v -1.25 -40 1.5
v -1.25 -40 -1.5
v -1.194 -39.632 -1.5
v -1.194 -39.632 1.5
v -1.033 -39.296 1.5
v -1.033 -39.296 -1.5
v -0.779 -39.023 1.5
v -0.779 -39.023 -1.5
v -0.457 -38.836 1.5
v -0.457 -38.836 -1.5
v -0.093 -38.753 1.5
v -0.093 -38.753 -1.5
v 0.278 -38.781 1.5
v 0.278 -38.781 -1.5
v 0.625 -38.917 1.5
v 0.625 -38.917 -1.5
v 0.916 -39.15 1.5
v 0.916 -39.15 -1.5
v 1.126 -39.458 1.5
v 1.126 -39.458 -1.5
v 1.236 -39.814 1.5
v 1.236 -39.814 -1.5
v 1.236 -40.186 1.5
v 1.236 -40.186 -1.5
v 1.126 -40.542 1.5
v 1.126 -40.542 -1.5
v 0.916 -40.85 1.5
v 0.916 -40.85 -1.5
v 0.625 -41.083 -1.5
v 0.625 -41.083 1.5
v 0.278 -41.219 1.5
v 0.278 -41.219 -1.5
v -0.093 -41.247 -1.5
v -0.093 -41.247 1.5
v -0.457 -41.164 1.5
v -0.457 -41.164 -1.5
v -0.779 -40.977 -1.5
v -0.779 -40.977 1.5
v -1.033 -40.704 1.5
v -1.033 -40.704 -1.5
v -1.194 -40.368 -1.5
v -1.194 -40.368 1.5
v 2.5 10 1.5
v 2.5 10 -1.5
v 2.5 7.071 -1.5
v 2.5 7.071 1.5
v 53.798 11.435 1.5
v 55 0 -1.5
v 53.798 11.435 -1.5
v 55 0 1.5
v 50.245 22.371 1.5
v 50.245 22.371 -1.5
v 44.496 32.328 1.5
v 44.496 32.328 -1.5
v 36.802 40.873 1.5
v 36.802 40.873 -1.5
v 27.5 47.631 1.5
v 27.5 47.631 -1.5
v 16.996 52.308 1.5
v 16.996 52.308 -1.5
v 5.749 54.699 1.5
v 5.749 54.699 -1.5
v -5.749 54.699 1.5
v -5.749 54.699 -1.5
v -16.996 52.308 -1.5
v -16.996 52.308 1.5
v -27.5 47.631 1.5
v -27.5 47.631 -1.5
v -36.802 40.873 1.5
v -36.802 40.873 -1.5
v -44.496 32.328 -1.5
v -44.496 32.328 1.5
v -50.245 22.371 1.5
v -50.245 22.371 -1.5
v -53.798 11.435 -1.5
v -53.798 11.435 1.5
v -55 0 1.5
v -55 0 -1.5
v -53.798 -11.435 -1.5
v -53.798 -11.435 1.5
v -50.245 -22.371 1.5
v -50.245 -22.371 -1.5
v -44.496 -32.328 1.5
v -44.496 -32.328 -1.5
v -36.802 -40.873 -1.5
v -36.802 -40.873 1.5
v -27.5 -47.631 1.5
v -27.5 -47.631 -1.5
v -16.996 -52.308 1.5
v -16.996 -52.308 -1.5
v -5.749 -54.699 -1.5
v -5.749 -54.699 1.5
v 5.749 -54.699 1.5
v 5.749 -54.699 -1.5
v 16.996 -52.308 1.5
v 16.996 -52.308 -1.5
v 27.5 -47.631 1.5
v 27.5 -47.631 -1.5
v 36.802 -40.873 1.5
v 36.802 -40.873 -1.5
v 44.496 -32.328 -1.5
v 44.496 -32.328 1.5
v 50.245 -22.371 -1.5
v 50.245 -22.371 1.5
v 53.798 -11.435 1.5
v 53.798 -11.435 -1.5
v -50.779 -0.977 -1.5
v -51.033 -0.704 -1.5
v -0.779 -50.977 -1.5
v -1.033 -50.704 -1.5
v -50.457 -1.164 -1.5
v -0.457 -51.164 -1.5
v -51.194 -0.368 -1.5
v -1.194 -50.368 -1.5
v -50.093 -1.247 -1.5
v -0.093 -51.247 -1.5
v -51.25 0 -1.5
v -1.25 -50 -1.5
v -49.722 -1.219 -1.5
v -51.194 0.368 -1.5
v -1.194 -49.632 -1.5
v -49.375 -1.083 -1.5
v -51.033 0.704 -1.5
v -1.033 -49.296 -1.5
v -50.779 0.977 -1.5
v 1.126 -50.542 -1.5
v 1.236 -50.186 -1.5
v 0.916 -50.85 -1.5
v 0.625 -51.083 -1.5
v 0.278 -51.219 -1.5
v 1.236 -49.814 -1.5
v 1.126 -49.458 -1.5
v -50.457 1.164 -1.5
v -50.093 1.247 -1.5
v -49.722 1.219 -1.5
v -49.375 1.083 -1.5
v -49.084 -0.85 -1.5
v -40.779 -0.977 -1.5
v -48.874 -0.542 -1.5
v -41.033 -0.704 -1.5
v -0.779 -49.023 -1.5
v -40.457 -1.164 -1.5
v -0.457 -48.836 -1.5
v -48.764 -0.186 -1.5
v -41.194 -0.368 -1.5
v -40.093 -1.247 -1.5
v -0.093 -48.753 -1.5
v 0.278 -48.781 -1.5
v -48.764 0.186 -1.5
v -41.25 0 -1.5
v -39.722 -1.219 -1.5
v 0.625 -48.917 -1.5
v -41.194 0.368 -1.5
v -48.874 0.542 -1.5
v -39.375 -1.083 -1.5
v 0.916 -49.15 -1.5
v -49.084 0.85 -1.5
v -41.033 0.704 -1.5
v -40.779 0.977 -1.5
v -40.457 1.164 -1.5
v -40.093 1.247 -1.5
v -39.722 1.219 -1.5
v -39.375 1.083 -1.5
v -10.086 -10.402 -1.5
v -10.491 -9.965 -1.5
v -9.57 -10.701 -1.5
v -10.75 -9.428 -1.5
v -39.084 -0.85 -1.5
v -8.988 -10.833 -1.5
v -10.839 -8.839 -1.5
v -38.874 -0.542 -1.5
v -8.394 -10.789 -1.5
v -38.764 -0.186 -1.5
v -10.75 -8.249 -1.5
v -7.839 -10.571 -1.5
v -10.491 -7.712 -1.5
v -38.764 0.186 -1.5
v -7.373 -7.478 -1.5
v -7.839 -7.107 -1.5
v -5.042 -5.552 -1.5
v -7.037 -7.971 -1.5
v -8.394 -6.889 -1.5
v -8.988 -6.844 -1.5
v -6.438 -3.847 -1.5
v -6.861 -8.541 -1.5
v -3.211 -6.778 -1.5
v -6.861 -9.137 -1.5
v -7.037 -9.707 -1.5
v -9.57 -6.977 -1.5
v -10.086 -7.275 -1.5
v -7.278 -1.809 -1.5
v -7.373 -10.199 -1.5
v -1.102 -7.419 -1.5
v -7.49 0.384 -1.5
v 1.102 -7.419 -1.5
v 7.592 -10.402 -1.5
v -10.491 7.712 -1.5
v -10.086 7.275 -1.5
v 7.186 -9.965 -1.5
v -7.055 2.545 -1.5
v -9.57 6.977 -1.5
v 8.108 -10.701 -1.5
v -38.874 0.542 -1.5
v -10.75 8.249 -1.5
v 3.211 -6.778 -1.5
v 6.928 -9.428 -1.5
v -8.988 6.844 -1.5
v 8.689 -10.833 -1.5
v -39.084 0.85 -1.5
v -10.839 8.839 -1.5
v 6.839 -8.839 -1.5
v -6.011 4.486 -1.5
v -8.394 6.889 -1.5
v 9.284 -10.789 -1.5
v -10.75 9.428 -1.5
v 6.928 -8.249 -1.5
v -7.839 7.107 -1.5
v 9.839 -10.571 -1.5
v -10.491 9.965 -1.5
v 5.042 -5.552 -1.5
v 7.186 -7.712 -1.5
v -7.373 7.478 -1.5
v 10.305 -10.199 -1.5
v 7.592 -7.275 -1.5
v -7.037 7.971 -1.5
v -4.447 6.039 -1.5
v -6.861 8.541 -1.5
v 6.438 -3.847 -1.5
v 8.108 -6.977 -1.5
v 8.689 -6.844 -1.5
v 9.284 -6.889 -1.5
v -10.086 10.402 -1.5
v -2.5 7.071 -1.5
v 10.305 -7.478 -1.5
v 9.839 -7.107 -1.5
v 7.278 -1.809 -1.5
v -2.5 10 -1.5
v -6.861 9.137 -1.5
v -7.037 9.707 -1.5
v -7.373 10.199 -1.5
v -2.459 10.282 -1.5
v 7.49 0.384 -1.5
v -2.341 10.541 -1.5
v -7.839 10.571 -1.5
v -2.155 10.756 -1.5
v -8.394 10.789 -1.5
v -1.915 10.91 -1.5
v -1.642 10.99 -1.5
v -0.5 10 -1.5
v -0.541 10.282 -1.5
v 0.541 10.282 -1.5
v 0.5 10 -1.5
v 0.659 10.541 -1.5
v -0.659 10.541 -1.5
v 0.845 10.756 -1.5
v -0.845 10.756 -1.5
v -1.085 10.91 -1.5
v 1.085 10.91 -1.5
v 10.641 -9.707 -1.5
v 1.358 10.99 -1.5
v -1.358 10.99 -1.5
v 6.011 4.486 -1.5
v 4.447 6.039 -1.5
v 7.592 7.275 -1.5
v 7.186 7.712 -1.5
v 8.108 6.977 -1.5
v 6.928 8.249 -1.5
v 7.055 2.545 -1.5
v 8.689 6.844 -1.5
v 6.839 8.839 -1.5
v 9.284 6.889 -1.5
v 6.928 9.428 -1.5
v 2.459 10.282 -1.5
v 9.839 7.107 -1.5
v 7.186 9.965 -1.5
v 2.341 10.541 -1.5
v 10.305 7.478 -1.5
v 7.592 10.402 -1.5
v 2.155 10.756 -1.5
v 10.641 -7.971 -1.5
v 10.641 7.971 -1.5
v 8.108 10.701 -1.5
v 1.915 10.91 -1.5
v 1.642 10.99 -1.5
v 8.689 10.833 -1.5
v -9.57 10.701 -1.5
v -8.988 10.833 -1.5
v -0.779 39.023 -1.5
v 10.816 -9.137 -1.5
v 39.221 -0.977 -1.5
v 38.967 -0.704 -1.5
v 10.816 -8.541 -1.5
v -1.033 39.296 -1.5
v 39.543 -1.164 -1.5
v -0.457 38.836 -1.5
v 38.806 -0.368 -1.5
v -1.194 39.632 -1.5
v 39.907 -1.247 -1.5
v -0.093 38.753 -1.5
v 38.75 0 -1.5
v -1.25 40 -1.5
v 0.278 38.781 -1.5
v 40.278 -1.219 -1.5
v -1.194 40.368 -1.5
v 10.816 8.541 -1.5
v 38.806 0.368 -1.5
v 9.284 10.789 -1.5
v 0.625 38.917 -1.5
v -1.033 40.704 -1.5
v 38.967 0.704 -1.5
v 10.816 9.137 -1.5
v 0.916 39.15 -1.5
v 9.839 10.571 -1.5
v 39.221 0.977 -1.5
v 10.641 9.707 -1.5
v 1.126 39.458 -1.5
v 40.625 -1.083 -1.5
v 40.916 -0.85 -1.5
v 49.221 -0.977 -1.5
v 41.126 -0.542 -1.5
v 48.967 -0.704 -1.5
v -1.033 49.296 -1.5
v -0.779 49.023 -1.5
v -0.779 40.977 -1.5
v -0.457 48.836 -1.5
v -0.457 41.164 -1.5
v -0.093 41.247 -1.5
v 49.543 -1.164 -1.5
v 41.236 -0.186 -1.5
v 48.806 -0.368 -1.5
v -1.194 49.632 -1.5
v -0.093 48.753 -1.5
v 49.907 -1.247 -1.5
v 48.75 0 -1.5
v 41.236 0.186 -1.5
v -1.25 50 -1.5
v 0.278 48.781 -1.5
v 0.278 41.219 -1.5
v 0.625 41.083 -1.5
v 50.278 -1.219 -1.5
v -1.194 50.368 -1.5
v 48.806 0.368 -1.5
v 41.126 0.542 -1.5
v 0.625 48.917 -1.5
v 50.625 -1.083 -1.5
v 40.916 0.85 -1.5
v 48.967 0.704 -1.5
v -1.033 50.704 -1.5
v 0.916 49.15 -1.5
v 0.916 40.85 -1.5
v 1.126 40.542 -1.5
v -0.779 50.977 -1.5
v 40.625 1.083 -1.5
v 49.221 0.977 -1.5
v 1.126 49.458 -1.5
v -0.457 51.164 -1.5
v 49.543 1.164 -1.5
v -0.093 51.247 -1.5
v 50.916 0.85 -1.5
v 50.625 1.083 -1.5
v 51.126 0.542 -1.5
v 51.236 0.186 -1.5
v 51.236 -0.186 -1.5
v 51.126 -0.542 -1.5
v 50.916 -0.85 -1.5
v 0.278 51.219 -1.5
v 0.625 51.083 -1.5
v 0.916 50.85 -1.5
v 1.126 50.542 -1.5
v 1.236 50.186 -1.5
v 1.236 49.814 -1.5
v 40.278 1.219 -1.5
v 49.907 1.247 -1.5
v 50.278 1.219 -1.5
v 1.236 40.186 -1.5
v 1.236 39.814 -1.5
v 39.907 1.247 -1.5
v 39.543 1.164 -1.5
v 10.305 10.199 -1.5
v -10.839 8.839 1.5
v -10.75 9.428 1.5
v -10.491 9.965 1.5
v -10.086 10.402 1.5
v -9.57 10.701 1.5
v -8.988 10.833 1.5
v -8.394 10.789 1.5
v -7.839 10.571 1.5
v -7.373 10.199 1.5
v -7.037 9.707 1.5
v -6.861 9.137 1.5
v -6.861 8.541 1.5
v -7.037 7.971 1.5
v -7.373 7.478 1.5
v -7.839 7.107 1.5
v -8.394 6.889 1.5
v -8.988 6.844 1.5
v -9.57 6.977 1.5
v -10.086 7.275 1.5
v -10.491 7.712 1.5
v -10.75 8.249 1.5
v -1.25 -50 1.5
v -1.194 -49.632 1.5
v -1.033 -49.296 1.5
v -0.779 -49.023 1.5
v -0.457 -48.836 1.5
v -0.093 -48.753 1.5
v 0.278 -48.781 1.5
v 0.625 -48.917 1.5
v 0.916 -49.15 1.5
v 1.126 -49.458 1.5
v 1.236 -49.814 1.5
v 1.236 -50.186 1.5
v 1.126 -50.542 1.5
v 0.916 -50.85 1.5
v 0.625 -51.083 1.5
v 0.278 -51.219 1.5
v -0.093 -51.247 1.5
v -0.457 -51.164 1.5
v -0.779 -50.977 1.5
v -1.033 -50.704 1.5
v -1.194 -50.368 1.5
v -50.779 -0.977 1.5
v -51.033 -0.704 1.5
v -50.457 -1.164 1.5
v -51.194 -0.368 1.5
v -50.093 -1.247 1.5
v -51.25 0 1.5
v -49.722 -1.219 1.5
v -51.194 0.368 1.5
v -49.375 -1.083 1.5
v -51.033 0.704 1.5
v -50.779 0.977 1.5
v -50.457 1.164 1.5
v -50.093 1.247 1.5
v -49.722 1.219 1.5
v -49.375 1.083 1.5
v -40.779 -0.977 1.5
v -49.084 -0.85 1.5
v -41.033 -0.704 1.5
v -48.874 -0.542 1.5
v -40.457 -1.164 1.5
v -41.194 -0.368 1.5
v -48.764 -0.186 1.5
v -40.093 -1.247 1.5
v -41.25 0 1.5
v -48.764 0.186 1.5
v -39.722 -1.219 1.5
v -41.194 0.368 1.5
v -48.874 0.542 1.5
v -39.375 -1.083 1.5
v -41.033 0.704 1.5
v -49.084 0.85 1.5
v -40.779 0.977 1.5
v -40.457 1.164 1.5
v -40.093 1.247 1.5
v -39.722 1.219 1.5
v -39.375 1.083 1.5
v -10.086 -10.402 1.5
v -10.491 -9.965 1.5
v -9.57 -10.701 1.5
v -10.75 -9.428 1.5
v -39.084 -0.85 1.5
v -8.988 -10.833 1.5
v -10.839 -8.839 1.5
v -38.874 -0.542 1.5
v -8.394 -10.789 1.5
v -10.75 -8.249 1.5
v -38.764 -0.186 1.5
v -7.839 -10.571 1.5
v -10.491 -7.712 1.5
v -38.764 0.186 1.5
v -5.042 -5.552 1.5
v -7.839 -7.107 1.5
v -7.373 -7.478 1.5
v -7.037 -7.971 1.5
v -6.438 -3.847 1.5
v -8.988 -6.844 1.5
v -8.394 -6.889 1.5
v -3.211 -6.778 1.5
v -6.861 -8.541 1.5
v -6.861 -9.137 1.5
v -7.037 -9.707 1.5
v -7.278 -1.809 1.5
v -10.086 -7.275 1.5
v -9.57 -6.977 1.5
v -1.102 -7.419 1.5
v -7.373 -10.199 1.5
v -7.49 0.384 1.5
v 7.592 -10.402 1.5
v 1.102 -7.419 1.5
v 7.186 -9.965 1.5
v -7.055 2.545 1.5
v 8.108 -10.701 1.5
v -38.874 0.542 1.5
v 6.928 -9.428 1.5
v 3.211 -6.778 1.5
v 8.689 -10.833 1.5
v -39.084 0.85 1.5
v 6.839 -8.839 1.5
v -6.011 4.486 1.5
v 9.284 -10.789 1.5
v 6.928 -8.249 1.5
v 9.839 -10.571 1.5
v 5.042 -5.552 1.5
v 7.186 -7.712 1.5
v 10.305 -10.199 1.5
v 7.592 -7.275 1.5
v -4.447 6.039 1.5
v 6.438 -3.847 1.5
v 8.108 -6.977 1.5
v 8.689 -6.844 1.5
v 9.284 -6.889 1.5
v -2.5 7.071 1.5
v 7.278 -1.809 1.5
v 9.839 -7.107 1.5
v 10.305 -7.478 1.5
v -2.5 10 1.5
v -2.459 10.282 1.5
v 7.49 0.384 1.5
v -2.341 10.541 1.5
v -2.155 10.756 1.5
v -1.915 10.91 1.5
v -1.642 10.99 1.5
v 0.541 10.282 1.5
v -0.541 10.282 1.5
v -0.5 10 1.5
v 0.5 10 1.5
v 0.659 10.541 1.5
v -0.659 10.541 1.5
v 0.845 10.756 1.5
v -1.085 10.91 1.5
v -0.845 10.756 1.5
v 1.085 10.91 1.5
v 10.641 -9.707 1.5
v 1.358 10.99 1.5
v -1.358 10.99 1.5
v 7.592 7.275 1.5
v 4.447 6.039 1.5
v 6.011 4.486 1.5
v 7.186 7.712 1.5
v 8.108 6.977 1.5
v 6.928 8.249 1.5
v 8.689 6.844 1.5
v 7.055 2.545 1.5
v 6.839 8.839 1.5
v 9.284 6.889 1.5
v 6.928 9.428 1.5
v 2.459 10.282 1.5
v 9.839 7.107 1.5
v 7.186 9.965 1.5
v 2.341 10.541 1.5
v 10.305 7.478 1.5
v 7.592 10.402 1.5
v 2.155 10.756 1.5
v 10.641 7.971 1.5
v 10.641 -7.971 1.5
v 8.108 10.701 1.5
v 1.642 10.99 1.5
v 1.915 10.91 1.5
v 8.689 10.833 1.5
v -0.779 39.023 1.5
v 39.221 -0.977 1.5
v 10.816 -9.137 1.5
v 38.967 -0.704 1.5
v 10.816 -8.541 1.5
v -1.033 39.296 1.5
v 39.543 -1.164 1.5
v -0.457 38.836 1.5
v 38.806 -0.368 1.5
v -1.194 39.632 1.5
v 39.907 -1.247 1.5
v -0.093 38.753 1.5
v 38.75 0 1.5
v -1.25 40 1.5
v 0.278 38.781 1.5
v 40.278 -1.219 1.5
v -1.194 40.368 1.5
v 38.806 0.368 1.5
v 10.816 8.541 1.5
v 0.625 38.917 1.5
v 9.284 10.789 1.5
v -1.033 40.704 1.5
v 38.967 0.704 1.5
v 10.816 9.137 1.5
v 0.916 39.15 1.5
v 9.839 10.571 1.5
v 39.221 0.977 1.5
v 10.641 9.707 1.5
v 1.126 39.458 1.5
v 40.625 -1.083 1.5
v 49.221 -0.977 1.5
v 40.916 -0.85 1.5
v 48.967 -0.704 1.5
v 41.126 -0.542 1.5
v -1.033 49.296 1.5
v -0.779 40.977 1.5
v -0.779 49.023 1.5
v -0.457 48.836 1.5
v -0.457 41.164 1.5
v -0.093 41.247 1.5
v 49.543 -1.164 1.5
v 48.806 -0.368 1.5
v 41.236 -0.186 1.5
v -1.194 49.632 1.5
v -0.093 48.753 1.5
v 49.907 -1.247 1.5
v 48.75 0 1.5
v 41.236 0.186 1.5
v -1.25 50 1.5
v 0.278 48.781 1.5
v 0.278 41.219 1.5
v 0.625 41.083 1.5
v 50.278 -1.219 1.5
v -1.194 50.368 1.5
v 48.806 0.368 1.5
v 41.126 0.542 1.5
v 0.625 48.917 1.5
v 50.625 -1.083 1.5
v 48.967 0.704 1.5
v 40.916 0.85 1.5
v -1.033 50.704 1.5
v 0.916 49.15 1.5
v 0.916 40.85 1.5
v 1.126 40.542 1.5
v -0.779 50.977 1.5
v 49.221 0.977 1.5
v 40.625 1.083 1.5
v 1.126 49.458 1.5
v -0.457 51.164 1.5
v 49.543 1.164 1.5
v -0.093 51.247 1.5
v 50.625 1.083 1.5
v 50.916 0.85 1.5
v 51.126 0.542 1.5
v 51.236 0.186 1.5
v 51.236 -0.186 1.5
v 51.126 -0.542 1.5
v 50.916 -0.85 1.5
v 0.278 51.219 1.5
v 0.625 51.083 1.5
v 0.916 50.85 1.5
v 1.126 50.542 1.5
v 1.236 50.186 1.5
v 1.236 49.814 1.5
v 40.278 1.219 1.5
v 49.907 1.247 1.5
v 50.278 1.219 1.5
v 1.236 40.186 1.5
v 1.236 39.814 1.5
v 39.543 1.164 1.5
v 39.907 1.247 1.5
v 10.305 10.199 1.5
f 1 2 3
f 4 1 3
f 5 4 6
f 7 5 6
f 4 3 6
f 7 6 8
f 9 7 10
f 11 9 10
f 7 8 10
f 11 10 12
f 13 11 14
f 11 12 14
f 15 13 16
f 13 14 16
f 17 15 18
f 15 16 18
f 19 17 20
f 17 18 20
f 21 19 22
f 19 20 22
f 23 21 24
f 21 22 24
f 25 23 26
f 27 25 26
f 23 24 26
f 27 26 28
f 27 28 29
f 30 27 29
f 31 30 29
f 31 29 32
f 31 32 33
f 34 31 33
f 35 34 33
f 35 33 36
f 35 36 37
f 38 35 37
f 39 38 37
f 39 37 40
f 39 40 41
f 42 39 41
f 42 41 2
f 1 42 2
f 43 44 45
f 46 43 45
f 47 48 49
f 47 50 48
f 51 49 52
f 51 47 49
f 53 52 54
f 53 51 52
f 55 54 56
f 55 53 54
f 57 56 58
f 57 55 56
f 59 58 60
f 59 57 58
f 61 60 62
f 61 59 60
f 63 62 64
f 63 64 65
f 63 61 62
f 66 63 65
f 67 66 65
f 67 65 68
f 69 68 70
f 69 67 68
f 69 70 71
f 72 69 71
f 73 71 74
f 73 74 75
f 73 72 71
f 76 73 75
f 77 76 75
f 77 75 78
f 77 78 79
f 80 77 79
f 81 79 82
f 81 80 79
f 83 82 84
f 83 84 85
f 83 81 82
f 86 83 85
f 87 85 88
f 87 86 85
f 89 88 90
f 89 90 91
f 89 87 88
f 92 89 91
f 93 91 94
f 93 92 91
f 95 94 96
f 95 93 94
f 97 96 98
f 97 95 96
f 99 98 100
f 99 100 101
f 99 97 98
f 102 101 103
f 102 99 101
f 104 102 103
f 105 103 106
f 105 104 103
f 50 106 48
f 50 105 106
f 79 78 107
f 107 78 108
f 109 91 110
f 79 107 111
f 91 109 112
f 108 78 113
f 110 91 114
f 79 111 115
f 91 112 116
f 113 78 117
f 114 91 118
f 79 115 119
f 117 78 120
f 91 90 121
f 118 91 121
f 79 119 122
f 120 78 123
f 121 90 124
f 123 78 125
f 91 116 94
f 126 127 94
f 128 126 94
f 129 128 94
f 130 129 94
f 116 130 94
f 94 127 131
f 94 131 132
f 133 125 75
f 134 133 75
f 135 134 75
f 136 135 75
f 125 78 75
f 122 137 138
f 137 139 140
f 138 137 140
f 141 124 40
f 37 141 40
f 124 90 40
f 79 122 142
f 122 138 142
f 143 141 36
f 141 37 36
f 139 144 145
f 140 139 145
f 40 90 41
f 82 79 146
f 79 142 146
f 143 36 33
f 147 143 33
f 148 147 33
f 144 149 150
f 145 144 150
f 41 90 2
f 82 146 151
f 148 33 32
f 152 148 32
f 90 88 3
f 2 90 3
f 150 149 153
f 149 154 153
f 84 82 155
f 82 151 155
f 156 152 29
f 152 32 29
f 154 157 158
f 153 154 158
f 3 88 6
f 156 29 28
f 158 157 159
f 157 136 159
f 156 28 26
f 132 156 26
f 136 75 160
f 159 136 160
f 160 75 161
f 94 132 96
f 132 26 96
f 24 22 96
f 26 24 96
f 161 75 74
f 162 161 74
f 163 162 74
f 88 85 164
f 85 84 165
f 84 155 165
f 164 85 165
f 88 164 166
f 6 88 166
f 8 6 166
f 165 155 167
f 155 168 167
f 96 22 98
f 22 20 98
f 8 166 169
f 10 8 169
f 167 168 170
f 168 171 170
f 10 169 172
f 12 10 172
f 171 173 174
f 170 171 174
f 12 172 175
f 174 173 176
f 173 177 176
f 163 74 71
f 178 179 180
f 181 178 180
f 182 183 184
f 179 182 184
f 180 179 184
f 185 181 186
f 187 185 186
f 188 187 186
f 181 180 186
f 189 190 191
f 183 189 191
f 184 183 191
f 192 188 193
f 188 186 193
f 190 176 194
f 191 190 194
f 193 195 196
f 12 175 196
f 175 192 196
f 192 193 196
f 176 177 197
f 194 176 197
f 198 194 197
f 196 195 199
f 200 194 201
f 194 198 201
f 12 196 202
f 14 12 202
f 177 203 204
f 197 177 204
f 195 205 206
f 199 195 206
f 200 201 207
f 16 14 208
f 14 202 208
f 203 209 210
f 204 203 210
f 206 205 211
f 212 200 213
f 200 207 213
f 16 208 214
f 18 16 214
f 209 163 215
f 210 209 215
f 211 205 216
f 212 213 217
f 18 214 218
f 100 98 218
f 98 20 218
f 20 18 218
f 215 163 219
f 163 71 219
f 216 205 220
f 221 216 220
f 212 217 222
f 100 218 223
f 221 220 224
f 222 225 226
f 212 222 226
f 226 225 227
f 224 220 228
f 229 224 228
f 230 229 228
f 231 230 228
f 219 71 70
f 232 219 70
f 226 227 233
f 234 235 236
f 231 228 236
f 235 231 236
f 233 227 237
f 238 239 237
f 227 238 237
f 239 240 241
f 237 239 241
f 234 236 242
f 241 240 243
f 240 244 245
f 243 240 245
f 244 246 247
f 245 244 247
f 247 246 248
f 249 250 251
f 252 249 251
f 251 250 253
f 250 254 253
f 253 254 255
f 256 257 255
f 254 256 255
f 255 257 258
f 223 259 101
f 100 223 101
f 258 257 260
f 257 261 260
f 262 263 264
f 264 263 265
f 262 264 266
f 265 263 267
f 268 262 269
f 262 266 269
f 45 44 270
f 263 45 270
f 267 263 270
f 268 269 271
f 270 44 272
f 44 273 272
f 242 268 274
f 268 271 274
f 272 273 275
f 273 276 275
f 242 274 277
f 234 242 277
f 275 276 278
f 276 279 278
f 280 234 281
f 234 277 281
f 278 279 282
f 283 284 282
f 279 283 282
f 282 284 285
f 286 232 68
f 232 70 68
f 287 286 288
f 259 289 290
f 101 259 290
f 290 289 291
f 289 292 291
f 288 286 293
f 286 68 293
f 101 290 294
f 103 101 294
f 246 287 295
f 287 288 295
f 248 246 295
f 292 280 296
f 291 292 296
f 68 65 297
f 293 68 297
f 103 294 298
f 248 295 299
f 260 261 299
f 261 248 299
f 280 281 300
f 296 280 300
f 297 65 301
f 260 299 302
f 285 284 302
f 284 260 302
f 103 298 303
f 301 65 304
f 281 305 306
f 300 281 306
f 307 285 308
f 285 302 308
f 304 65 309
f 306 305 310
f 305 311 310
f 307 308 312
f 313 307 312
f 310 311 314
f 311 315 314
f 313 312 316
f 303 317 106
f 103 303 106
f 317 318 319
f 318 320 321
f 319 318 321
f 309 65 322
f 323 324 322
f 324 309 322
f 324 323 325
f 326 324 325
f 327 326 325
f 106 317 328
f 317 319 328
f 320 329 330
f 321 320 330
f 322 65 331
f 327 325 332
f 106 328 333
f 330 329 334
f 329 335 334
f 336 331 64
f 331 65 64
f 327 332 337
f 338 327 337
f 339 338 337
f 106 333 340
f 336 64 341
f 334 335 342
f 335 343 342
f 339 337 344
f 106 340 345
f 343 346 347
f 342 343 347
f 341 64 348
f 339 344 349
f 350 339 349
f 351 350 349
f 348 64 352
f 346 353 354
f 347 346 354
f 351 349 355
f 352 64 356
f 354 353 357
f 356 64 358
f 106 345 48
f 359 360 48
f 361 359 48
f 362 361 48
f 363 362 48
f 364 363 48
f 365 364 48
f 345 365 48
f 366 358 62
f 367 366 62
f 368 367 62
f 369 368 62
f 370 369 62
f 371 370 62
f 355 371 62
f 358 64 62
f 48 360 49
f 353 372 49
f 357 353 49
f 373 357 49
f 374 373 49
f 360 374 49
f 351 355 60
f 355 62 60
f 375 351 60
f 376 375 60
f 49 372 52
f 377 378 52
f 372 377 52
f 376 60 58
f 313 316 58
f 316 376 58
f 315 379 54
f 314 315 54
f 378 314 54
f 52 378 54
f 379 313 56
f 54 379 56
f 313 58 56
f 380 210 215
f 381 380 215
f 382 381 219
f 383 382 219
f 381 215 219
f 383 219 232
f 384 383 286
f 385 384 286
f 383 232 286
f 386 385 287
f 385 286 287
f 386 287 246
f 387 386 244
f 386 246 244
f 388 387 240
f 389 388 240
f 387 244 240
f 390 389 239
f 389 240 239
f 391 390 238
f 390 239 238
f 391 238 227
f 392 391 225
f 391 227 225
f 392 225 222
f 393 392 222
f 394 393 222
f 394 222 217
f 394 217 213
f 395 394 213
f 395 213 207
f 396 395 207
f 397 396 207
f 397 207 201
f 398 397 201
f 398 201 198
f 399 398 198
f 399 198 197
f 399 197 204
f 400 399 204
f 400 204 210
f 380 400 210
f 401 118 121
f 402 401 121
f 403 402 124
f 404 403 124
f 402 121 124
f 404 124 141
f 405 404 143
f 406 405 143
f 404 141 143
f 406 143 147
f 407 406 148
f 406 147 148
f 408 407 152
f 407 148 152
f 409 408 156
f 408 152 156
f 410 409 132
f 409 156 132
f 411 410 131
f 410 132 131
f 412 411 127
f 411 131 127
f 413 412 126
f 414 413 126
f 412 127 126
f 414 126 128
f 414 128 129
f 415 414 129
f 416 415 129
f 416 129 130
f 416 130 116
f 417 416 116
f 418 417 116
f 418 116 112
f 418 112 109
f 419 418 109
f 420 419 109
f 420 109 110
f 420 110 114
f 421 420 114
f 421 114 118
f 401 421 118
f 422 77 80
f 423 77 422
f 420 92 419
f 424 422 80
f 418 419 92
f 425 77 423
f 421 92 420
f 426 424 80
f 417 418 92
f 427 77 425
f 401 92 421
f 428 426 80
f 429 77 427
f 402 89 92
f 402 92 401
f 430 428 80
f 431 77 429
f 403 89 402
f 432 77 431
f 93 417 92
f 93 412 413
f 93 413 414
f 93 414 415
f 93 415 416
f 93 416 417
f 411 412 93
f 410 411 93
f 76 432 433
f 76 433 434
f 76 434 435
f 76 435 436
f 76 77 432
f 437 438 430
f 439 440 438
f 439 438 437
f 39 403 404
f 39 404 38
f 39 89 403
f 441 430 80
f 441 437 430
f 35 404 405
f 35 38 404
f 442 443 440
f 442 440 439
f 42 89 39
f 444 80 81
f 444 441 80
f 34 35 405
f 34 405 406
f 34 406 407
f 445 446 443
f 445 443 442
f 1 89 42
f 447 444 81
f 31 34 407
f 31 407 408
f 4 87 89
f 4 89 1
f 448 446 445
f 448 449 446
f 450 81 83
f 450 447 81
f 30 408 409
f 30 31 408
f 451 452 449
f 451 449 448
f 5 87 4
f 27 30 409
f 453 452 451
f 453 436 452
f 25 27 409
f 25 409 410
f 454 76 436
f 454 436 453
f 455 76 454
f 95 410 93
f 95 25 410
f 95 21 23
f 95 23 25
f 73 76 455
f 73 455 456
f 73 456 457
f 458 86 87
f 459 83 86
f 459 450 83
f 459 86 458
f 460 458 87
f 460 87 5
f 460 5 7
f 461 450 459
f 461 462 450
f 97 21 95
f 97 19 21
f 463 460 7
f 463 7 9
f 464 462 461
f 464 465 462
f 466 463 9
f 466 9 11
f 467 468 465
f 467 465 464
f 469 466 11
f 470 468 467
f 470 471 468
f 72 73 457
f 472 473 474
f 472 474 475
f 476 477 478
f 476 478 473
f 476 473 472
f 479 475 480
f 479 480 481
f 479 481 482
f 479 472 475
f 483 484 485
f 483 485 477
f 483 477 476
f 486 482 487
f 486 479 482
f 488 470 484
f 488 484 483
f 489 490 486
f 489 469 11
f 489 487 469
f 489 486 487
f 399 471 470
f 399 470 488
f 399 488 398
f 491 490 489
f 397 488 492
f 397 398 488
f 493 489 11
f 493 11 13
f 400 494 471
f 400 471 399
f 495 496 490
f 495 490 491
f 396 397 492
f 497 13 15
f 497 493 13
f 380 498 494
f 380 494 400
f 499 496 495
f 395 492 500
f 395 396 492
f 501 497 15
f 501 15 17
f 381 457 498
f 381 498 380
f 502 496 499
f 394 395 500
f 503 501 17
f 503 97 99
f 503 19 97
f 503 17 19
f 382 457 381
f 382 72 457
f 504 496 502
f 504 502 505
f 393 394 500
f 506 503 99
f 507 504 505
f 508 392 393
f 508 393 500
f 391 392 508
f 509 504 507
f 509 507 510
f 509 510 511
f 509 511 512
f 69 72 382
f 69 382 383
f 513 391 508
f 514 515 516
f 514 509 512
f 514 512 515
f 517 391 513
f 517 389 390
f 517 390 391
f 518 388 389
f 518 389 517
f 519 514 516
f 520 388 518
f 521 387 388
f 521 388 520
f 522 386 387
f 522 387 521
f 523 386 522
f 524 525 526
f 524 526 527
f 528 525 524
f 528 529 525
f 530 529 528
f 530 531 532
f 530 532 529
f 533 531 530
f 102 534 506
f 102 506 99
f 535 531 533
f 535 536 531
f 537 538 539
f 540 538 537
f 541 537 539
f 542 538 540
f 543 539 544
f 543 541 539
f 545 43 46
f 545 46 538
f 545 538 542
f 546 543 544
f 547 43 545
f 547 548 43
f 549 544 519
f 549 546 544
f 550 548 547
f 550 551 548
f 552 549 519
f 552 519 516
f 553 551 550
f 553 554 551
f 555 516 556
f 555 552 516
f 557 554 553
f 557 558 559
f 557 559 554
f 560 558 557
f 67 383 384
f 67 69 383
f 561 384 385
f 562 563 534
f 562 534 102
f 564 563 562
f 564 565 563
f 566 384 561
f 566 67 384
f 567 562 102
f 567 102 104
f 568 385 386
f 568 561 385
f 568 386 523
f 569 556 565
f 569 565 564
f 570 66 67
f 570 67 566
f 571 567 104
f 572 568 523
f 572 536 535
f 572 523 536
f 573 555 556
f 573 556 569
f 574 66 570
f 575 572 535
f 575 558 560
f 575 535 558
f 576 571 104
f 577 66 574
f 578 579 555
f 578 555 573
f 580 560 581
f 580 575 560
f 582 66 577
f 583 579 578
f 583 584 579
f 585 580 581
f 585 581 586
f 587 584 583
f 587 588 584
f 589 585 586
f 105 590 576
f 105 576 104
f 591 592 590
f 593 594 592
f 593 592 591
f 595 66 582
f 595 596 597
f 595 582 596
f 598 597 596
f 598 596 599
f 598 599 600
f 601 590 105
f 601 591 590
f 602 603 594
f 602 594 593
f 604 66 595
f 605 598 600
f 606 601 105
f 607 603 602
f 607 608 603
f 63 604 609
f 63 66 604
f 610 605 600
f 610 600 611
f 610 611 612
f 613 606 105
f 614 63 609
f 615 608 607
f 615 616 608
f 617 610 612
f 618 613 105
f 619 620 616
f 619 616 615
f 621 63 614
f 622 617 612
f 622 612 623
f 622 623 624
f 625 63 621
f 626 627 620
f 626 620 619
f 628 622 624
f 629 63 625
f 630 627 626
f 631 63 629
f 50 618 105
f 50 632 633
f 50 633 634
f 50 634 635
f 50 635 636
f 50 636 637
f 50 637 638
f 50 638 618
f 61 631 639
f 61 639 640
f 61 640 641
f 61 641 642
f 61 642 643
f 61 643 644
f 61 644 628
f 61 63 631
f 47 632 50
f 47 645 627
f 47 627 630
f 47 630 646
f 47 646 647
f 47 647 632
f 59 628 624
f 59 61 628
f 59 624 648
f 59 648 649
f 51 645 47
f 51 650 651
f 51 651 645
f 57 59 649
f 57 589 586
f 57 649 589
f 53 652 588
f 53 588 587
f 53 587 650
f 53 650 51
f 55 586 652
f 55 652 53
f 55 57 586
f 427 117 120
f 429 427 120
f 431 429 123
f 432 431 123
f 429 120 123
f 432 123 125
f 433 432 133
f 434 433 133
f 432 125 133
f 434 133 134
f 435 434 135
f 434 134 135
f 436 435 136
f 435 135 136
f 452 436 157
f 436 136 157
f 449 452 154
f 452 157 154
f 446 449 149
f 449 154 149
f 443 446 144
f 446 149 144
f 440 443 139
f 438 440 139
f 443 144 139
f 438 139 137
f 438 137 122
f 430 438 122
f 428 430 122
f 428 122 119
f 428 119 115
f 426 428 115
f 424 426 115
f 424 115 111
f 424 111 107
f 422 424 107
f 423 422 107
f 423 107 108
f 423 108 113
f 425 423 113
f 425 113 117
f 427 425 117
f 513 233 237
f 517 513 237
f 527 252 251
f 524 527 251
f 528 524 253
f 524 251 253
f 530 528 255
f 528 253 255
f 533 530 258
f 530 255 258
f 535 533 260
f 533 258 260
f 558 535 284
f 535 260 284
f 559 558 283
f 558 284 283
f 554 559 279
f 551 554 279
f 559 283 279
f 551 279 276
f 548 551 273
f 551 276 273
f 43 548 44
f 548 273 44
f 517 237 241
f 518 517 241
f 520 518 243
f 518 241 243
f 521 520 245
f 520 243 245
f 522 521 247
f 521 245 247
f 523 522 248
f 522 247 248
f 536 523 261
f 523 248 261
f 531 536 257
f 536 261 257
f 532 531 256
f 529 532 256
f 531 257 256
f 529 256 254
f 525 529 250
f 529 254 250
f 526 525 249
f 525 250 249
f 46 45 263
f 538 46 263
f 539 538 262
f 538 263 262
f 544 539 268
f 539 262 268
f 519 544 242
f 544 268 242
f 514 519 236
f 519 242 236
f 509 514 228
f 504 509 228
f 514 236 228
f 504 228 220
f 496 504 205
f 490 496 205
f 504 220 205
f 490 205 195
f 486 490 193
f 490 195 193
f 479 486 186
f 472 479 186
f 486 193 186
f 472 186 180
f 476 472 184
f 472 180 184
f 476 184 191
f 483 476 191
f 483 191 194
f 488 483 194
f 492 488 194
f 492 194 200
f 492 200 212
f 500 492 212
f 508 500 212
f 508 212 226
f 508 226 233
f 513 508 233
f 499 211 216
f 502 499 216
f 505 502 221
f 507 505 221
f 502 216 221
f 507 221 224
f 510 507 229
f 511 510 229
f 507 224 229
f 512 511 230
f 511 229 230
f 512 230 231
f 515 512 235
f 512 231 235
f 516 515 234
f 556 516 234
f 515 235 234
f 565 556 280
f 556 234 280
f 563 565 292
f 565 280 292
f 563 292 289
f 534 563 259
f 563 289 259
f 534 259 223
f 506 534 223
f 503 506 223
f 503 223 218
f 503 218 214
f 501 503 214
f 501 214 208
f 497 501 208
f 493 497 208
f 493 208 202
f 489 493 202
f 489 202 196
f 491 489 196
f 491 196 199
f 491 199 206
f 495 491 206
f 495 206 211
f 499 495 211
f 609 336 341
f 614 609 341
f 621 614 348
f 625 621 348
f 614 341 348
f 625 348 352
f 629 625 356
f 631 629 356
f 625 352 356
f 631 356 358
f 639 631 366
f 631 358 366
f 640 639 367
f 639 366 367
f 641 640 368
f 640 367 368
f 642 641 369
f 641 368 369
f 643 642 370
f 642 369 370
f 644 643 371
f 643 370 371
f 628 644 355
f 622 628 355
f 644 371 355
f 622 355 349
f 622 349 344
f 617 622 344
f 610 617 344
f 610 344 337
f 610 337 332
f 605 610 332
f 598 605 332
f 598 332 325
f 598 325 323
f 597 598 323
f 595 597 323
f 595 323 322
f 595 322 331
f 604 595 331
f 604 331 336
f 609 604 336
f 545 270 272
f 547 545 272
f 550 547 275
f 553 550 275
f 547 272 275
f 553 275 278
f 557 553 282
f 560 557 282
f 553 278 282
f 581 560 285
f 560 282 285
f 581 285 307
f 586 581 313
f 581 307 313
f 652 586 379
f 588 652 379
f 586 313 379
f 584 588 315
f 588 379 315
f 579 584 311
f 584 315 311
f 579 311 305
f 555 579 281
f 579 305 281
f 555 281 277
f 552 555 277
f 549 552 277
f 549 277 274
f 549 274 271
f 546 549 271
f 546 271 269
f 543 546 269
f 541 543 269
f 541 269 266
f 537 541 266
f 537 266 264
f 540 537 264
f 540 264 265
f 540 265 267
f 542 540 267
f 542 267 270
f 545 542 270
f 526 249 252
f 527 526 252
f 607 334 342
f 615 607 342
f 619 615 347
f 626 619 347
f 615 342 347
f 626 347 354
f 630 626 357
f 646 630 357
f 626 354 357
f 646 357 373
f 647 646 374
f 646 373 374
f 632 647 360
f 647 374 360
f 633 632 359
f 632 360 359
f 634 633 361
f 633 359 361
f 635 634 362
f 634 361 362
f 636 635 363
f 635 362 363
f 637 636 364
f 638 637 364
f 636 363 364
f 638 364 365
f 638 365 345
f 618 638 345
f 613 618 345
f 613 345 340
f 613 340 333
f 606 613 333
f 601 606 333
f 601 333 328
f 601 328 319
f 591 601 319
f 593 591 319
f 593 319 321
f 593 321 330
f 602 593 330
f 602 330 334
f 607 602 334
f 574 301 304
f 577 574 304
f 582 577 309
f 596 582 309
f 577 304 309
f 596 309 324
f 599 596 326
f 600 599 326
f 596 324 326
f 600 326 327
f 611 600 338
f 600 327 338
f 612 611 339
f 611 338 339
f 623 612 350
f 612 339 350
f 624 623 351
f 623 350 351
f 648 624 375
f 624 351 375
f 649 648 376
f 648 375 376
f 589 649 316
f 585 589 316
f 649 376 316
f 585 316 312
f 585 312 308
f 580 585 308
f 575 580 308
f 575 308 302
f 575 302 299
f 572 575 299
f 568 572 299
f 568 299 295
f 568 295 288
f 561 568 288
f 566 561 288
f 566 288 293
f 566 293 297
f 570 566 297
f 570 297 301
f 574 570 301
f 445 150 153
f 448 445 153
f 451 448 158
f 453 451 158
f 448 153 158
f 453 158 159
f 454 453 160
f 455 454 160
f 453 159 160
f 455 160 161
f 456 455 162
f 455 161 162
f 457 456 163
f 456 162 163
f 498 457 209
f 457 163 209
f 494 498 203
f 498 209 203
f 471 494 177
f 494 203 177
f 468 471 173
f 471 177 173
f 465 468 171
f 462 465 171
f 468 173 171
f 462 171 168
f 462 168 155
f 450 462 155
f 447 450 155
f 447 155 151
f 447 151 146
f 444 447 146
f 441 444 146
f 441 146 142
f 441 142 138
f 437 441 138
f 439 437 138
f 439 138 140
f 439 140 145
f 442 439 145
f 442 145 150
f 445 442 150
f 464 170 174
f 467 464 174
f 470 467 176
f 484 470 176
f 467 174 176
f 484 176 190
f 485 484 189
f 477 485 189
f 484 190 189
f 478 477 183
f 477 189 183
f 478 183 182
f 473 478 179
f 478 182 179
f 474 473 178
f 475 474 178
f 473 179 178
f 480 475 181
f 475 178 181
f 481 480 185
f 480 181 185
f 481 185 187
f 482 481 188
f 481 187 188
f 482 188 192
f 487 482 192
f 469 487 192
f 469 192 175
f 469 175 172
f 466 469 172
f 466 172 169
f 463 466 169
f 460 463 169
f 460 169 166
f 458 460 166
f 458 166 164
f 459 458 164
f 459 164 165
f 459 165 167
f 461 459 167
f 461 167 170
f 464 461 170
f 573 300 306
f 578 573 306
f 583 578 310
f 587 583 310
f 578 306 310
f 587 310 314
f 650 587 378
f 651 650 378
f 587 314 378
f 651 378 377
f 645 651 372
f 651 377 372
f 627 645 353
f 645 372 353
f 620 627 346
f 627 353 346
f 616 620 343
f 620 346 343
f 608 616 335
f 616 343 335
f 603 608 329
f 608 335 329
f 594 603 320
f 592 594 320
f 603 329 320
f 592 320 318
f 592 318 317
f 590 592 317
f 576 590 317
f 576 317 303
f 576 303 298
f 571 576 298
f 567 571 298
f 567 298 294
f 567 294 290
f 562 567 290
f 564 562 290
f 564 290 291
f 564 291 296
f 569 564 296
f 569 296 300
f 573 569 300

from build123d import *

# Parameters (mm, degrees)
SKETCH_1_R               = 55
EXTRUDE_1_DEPTH          = 1.5
CUT_EXTRUDE_7_DEPTH      = 78.796208134
CUT_EXTRUDE_7_DEPTH_BACK = 78.796208134
M3X0_5_1_D               = 2.5
F_4_0MM_1_D              = 4
F_4_0MM_1_DEPTH          = 5
F_4_0MM_1_TIP            = 1.201721238


with BuildPart() as part:
    # ｽｹｯﾁ1 → ﾎﾞｽ - 押し出し1 (new, symmetric)
    with BuildSketch(Plane.XY):
        Circle(SKETCH_1_R)
    extrude(amount=EXTRUDE_1_DEPTH, both=True)

    # ｽｹｯﾁ1<4> → ｶｯﾄ - 押し出し7 (cut, two sides: drawn at the far end of the back side and taken through both)
    with BuildSketch(Plane.XY.offset(-CUT_EXTRUDE_7_DEPTH_BACK)):
        with BuildLine():
            Line((-2.5, 10), (-2.5, 7.071067812))
            ThreePointArc((-2.5, 7.071067812), (0, -7.5), (2.5, 7.071067812))
            Line((2.5, 7.071067812), (2.5, 10))
            ThreePointArc((2.5, 10), (1.5, 11), (0.5, 10))
            Line((0.5, 10), (-0.5, 10))
            ThreePointArc((-0.5, 10), (-1.5, 11), (-2.5, 10))
        make_face()
    extrude(amount=CUT_EXTRUDE_7_DEPTH + CUT_EXTRUDE_7_DEPTH_BACK, mode=Mode.SUBTRACT)

    # M3x0.5 ねじ穴1 (through all)
    with Locations(Plane(origin=(0, 50, 1.5), x_dir=(1, 0, 0), z_dir=(0, 0, 1))):
        with Locations((0, 0), (0, -10), (-50, -50), (-40, -50), (0, -100), (0, -90), (50, -50), (40, -50)):
            Hole(M3X0_5_1_D / 2)

    # Ø4.0mm ﾀﾞｳｴﾙ穴1
    with Locations(Plane.XY.offset(1.5)):
        with Locations((-8.838834765, -8.838834765), (-8.838834765, 8.838834765), (8.838834765, 8.838834765), (8.838834765, -8.838834765)):
            Hole(F_4_0MM_1_D / 2, depth=F_4_0MM_1_DEPTH)
            with Locations((0, 0, -(F_4_0MM_1_DEPTH + F_4_0MM_1_TIP / 2))):  # 118° drill point
                Cone(0, F_4_0MM_1_D / 2, F_4_0MM_1_TIP, mode=Mode.SUBTRACT)


solid = part.part
